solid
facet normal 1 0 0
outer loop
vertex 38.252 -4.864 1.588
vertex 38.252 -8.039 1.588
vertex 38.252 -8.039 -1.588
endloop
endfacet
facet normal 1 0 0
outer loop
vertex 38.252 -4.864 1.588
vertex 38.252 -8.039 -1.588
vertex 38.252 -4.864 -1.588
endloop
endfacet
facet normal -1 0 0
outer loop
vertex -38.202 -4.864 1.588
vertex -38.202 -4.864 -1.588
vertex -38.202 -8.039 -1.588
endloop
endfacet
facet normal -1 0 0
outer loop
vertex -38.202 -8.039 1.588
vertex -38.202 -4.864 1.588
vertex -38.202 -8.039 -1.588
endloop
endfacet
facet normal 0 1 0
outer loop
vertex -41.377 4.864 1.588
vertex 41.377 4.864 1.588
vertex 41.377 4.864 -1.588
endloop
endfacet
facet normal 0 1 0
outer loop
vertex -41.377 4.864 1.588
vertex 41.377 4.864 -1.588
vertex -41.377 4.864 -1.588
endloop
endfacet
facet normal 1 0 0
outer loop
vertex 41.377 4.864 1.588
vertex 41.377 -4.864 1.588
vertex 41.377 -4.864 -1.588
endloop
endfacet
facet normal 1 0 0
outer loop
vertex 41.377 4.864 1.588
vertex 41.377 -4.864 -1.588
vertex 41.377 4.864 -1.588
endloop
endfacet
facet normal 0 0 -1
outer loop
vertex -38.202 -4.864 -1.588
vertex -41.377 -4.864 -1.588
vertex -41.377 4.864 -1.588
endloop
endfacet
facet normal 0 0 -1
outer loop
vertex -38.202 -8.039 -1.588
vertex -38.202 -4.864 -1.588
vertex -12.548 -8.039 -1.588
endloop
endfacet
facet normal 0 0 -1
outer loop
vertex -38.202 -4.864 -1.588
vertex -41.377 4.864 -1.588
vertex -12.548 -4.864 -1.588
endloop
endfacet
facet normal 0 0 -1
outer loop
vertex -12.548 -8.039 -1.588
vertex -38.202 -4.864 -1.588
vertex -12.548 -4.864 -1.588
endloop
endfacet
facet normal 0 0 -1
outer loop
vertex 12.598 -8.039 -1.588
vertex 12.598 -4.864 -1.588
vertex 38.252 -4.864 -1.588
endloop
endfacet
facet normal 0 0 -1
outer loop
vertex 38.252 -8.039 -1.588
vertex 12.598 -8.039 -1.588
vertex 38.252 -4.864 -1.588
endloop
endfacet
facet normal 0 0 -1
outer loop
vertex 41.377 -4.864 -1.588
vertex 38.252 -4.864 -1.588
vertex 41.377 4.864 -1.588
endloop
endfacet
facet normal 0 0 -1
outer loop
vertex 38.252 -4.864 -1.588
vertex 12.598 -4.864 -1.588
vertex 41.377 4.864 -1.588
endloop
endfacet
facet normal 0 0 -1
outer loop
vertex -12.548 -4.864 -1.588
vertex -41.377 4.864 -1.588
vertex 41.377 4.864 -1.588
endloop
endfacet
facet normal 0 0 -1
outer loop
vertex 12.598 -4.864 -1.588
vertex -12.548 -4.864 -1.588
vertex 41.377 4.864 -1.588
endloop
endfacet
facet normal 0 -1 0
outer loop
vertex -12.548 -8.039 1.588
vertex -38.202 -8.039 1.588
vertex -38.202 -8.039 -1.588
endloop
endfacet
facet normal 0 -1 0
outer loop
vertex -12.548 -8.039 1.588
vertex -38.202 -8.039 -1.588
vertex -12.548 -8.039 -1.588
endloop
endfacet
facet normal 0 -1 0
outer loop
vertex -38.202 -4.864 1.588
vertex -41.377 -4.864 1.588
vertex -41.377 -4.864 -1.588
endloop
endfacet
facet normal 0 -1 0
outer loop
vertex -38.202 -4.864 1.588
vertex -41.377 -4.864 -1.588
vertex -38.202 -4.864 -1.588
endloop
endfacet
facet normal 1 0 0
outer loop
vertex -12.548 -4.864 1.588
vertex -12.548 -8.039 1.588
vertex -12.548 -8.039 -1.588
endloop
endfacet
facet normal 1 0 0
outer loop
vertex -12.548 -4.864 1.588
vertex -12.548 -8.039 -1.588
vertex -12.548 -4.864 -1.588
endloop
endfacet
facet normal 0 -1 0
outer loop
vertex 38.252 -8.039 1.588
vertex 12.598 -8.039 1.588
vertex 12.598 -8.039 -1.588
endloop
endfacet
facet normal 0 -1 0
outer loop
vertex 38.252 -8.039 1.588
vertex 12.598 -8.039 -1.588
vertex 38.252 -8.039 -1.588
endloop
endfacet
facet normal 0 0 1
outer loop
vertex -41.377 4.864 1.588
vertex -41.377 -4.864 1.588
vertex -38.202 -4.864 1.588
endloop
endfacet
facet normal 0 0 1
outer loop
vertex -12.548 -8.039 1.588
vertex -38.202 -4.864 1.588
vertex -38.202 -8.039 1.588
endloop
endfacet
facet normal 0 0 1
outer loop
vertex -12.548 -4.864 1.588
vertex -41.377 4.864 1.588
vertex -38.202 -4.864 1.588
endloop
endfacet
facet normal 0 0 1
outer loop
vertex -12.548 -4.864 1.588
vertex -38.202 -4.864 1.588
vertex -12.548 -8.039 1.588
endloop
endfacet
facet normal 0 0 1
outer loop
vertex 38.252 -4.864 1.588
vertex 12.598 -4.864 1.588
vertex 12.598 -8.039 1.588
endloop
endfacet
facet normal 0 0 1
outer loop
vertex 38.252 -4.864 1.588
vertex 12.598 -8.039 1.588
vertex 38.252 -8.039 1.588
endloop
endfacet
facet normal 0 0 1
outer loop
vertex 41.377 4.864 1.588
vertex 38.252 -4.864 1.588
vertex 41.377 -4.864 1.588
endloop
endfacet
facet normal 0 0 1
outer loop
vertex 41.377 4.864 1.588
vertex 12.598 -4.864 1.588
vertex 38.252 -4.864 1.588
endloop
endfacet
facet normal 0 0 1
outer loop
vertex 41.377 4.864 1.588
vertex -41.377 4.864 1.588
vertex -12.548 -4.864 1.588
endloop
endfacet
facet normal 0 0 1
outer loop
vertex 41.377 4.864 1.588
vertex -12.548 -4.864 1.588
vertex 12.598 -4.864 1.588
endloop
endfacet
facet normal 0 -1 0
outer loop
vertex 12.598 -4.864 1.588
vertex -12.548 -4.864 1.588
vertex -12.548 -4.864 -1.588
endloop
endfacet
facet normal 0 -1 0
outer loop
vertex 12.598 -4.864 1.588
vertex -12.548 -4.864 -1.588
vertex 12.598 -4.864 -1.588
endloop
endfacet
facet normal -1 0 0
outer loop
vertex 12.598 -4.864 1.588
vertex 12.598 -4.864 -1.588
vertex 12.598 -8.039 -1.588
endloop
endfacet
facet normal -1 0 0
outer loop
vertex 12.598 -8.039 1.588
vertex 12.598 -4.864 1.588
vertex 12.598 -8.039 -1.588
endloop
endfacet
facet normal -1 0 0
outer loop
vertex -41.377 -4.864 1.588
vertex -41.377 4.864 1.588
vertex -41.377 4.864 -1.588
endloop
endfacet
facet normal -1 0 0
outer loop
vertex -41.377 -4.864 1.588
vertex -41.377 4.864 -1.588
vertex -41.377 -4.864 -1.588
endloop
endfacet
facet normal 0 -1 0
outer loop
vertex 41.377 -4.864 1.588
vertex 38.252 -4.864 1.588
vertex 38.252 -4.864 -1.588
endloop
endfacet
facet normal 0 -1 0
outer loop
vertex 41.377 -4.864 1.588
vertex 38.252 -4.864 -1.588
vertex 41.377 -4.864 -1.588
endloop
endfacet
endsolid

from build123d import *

# Parameters (mm, degrees)
BOSS_EXTRUDE1_DEPTH = 1.5875
BOSS_EXTRUDE2_DEPTH = 3.175


with BuildPart() as part:
    # Sketch1 → Boss-Extrude1 (new body, symmetric)
    with BuildSketch(Plane.XY):
        Polygon((-12.6492, -4.7625), (12.7, -4.7625), (12.7, -7.9375), (38.1508, -7.9375), (38.1508, -4.7625), (41.275, -4.7625), (41.275, 4.7625), (-41.275, 4.7625), (-41.275, -4.7625), (-38.1, -4.7625), (-38.1, -7.9375), (-12.6492, -7.9375), align=None)
    extrude(amount=BOSS_EXTRUDE1_DEPTH, both=True)

    # Sketch2 → Boss-Extrude2 (add)
    with BuildSketch(Plane.XY.offset(1.5875)):
        Polygon((38.2524, -4.8641), (41.3766, -4.8641), (41.3766, 4.8641), (-41.3766, 4.8641), (-41.3766, -4.8641), (-38.2016, -4.8641), (-38.2016, -8.0391), (-12.5476, -8.0391), (-12.5476, -4.8641), (12.5984, -4.8641), (12.5984, -8.0391), (38.2524, -8.0391), align=None)
    extrude(amount=-BOSS_EXTRUDE2_DEPTH)


solid = part.part
